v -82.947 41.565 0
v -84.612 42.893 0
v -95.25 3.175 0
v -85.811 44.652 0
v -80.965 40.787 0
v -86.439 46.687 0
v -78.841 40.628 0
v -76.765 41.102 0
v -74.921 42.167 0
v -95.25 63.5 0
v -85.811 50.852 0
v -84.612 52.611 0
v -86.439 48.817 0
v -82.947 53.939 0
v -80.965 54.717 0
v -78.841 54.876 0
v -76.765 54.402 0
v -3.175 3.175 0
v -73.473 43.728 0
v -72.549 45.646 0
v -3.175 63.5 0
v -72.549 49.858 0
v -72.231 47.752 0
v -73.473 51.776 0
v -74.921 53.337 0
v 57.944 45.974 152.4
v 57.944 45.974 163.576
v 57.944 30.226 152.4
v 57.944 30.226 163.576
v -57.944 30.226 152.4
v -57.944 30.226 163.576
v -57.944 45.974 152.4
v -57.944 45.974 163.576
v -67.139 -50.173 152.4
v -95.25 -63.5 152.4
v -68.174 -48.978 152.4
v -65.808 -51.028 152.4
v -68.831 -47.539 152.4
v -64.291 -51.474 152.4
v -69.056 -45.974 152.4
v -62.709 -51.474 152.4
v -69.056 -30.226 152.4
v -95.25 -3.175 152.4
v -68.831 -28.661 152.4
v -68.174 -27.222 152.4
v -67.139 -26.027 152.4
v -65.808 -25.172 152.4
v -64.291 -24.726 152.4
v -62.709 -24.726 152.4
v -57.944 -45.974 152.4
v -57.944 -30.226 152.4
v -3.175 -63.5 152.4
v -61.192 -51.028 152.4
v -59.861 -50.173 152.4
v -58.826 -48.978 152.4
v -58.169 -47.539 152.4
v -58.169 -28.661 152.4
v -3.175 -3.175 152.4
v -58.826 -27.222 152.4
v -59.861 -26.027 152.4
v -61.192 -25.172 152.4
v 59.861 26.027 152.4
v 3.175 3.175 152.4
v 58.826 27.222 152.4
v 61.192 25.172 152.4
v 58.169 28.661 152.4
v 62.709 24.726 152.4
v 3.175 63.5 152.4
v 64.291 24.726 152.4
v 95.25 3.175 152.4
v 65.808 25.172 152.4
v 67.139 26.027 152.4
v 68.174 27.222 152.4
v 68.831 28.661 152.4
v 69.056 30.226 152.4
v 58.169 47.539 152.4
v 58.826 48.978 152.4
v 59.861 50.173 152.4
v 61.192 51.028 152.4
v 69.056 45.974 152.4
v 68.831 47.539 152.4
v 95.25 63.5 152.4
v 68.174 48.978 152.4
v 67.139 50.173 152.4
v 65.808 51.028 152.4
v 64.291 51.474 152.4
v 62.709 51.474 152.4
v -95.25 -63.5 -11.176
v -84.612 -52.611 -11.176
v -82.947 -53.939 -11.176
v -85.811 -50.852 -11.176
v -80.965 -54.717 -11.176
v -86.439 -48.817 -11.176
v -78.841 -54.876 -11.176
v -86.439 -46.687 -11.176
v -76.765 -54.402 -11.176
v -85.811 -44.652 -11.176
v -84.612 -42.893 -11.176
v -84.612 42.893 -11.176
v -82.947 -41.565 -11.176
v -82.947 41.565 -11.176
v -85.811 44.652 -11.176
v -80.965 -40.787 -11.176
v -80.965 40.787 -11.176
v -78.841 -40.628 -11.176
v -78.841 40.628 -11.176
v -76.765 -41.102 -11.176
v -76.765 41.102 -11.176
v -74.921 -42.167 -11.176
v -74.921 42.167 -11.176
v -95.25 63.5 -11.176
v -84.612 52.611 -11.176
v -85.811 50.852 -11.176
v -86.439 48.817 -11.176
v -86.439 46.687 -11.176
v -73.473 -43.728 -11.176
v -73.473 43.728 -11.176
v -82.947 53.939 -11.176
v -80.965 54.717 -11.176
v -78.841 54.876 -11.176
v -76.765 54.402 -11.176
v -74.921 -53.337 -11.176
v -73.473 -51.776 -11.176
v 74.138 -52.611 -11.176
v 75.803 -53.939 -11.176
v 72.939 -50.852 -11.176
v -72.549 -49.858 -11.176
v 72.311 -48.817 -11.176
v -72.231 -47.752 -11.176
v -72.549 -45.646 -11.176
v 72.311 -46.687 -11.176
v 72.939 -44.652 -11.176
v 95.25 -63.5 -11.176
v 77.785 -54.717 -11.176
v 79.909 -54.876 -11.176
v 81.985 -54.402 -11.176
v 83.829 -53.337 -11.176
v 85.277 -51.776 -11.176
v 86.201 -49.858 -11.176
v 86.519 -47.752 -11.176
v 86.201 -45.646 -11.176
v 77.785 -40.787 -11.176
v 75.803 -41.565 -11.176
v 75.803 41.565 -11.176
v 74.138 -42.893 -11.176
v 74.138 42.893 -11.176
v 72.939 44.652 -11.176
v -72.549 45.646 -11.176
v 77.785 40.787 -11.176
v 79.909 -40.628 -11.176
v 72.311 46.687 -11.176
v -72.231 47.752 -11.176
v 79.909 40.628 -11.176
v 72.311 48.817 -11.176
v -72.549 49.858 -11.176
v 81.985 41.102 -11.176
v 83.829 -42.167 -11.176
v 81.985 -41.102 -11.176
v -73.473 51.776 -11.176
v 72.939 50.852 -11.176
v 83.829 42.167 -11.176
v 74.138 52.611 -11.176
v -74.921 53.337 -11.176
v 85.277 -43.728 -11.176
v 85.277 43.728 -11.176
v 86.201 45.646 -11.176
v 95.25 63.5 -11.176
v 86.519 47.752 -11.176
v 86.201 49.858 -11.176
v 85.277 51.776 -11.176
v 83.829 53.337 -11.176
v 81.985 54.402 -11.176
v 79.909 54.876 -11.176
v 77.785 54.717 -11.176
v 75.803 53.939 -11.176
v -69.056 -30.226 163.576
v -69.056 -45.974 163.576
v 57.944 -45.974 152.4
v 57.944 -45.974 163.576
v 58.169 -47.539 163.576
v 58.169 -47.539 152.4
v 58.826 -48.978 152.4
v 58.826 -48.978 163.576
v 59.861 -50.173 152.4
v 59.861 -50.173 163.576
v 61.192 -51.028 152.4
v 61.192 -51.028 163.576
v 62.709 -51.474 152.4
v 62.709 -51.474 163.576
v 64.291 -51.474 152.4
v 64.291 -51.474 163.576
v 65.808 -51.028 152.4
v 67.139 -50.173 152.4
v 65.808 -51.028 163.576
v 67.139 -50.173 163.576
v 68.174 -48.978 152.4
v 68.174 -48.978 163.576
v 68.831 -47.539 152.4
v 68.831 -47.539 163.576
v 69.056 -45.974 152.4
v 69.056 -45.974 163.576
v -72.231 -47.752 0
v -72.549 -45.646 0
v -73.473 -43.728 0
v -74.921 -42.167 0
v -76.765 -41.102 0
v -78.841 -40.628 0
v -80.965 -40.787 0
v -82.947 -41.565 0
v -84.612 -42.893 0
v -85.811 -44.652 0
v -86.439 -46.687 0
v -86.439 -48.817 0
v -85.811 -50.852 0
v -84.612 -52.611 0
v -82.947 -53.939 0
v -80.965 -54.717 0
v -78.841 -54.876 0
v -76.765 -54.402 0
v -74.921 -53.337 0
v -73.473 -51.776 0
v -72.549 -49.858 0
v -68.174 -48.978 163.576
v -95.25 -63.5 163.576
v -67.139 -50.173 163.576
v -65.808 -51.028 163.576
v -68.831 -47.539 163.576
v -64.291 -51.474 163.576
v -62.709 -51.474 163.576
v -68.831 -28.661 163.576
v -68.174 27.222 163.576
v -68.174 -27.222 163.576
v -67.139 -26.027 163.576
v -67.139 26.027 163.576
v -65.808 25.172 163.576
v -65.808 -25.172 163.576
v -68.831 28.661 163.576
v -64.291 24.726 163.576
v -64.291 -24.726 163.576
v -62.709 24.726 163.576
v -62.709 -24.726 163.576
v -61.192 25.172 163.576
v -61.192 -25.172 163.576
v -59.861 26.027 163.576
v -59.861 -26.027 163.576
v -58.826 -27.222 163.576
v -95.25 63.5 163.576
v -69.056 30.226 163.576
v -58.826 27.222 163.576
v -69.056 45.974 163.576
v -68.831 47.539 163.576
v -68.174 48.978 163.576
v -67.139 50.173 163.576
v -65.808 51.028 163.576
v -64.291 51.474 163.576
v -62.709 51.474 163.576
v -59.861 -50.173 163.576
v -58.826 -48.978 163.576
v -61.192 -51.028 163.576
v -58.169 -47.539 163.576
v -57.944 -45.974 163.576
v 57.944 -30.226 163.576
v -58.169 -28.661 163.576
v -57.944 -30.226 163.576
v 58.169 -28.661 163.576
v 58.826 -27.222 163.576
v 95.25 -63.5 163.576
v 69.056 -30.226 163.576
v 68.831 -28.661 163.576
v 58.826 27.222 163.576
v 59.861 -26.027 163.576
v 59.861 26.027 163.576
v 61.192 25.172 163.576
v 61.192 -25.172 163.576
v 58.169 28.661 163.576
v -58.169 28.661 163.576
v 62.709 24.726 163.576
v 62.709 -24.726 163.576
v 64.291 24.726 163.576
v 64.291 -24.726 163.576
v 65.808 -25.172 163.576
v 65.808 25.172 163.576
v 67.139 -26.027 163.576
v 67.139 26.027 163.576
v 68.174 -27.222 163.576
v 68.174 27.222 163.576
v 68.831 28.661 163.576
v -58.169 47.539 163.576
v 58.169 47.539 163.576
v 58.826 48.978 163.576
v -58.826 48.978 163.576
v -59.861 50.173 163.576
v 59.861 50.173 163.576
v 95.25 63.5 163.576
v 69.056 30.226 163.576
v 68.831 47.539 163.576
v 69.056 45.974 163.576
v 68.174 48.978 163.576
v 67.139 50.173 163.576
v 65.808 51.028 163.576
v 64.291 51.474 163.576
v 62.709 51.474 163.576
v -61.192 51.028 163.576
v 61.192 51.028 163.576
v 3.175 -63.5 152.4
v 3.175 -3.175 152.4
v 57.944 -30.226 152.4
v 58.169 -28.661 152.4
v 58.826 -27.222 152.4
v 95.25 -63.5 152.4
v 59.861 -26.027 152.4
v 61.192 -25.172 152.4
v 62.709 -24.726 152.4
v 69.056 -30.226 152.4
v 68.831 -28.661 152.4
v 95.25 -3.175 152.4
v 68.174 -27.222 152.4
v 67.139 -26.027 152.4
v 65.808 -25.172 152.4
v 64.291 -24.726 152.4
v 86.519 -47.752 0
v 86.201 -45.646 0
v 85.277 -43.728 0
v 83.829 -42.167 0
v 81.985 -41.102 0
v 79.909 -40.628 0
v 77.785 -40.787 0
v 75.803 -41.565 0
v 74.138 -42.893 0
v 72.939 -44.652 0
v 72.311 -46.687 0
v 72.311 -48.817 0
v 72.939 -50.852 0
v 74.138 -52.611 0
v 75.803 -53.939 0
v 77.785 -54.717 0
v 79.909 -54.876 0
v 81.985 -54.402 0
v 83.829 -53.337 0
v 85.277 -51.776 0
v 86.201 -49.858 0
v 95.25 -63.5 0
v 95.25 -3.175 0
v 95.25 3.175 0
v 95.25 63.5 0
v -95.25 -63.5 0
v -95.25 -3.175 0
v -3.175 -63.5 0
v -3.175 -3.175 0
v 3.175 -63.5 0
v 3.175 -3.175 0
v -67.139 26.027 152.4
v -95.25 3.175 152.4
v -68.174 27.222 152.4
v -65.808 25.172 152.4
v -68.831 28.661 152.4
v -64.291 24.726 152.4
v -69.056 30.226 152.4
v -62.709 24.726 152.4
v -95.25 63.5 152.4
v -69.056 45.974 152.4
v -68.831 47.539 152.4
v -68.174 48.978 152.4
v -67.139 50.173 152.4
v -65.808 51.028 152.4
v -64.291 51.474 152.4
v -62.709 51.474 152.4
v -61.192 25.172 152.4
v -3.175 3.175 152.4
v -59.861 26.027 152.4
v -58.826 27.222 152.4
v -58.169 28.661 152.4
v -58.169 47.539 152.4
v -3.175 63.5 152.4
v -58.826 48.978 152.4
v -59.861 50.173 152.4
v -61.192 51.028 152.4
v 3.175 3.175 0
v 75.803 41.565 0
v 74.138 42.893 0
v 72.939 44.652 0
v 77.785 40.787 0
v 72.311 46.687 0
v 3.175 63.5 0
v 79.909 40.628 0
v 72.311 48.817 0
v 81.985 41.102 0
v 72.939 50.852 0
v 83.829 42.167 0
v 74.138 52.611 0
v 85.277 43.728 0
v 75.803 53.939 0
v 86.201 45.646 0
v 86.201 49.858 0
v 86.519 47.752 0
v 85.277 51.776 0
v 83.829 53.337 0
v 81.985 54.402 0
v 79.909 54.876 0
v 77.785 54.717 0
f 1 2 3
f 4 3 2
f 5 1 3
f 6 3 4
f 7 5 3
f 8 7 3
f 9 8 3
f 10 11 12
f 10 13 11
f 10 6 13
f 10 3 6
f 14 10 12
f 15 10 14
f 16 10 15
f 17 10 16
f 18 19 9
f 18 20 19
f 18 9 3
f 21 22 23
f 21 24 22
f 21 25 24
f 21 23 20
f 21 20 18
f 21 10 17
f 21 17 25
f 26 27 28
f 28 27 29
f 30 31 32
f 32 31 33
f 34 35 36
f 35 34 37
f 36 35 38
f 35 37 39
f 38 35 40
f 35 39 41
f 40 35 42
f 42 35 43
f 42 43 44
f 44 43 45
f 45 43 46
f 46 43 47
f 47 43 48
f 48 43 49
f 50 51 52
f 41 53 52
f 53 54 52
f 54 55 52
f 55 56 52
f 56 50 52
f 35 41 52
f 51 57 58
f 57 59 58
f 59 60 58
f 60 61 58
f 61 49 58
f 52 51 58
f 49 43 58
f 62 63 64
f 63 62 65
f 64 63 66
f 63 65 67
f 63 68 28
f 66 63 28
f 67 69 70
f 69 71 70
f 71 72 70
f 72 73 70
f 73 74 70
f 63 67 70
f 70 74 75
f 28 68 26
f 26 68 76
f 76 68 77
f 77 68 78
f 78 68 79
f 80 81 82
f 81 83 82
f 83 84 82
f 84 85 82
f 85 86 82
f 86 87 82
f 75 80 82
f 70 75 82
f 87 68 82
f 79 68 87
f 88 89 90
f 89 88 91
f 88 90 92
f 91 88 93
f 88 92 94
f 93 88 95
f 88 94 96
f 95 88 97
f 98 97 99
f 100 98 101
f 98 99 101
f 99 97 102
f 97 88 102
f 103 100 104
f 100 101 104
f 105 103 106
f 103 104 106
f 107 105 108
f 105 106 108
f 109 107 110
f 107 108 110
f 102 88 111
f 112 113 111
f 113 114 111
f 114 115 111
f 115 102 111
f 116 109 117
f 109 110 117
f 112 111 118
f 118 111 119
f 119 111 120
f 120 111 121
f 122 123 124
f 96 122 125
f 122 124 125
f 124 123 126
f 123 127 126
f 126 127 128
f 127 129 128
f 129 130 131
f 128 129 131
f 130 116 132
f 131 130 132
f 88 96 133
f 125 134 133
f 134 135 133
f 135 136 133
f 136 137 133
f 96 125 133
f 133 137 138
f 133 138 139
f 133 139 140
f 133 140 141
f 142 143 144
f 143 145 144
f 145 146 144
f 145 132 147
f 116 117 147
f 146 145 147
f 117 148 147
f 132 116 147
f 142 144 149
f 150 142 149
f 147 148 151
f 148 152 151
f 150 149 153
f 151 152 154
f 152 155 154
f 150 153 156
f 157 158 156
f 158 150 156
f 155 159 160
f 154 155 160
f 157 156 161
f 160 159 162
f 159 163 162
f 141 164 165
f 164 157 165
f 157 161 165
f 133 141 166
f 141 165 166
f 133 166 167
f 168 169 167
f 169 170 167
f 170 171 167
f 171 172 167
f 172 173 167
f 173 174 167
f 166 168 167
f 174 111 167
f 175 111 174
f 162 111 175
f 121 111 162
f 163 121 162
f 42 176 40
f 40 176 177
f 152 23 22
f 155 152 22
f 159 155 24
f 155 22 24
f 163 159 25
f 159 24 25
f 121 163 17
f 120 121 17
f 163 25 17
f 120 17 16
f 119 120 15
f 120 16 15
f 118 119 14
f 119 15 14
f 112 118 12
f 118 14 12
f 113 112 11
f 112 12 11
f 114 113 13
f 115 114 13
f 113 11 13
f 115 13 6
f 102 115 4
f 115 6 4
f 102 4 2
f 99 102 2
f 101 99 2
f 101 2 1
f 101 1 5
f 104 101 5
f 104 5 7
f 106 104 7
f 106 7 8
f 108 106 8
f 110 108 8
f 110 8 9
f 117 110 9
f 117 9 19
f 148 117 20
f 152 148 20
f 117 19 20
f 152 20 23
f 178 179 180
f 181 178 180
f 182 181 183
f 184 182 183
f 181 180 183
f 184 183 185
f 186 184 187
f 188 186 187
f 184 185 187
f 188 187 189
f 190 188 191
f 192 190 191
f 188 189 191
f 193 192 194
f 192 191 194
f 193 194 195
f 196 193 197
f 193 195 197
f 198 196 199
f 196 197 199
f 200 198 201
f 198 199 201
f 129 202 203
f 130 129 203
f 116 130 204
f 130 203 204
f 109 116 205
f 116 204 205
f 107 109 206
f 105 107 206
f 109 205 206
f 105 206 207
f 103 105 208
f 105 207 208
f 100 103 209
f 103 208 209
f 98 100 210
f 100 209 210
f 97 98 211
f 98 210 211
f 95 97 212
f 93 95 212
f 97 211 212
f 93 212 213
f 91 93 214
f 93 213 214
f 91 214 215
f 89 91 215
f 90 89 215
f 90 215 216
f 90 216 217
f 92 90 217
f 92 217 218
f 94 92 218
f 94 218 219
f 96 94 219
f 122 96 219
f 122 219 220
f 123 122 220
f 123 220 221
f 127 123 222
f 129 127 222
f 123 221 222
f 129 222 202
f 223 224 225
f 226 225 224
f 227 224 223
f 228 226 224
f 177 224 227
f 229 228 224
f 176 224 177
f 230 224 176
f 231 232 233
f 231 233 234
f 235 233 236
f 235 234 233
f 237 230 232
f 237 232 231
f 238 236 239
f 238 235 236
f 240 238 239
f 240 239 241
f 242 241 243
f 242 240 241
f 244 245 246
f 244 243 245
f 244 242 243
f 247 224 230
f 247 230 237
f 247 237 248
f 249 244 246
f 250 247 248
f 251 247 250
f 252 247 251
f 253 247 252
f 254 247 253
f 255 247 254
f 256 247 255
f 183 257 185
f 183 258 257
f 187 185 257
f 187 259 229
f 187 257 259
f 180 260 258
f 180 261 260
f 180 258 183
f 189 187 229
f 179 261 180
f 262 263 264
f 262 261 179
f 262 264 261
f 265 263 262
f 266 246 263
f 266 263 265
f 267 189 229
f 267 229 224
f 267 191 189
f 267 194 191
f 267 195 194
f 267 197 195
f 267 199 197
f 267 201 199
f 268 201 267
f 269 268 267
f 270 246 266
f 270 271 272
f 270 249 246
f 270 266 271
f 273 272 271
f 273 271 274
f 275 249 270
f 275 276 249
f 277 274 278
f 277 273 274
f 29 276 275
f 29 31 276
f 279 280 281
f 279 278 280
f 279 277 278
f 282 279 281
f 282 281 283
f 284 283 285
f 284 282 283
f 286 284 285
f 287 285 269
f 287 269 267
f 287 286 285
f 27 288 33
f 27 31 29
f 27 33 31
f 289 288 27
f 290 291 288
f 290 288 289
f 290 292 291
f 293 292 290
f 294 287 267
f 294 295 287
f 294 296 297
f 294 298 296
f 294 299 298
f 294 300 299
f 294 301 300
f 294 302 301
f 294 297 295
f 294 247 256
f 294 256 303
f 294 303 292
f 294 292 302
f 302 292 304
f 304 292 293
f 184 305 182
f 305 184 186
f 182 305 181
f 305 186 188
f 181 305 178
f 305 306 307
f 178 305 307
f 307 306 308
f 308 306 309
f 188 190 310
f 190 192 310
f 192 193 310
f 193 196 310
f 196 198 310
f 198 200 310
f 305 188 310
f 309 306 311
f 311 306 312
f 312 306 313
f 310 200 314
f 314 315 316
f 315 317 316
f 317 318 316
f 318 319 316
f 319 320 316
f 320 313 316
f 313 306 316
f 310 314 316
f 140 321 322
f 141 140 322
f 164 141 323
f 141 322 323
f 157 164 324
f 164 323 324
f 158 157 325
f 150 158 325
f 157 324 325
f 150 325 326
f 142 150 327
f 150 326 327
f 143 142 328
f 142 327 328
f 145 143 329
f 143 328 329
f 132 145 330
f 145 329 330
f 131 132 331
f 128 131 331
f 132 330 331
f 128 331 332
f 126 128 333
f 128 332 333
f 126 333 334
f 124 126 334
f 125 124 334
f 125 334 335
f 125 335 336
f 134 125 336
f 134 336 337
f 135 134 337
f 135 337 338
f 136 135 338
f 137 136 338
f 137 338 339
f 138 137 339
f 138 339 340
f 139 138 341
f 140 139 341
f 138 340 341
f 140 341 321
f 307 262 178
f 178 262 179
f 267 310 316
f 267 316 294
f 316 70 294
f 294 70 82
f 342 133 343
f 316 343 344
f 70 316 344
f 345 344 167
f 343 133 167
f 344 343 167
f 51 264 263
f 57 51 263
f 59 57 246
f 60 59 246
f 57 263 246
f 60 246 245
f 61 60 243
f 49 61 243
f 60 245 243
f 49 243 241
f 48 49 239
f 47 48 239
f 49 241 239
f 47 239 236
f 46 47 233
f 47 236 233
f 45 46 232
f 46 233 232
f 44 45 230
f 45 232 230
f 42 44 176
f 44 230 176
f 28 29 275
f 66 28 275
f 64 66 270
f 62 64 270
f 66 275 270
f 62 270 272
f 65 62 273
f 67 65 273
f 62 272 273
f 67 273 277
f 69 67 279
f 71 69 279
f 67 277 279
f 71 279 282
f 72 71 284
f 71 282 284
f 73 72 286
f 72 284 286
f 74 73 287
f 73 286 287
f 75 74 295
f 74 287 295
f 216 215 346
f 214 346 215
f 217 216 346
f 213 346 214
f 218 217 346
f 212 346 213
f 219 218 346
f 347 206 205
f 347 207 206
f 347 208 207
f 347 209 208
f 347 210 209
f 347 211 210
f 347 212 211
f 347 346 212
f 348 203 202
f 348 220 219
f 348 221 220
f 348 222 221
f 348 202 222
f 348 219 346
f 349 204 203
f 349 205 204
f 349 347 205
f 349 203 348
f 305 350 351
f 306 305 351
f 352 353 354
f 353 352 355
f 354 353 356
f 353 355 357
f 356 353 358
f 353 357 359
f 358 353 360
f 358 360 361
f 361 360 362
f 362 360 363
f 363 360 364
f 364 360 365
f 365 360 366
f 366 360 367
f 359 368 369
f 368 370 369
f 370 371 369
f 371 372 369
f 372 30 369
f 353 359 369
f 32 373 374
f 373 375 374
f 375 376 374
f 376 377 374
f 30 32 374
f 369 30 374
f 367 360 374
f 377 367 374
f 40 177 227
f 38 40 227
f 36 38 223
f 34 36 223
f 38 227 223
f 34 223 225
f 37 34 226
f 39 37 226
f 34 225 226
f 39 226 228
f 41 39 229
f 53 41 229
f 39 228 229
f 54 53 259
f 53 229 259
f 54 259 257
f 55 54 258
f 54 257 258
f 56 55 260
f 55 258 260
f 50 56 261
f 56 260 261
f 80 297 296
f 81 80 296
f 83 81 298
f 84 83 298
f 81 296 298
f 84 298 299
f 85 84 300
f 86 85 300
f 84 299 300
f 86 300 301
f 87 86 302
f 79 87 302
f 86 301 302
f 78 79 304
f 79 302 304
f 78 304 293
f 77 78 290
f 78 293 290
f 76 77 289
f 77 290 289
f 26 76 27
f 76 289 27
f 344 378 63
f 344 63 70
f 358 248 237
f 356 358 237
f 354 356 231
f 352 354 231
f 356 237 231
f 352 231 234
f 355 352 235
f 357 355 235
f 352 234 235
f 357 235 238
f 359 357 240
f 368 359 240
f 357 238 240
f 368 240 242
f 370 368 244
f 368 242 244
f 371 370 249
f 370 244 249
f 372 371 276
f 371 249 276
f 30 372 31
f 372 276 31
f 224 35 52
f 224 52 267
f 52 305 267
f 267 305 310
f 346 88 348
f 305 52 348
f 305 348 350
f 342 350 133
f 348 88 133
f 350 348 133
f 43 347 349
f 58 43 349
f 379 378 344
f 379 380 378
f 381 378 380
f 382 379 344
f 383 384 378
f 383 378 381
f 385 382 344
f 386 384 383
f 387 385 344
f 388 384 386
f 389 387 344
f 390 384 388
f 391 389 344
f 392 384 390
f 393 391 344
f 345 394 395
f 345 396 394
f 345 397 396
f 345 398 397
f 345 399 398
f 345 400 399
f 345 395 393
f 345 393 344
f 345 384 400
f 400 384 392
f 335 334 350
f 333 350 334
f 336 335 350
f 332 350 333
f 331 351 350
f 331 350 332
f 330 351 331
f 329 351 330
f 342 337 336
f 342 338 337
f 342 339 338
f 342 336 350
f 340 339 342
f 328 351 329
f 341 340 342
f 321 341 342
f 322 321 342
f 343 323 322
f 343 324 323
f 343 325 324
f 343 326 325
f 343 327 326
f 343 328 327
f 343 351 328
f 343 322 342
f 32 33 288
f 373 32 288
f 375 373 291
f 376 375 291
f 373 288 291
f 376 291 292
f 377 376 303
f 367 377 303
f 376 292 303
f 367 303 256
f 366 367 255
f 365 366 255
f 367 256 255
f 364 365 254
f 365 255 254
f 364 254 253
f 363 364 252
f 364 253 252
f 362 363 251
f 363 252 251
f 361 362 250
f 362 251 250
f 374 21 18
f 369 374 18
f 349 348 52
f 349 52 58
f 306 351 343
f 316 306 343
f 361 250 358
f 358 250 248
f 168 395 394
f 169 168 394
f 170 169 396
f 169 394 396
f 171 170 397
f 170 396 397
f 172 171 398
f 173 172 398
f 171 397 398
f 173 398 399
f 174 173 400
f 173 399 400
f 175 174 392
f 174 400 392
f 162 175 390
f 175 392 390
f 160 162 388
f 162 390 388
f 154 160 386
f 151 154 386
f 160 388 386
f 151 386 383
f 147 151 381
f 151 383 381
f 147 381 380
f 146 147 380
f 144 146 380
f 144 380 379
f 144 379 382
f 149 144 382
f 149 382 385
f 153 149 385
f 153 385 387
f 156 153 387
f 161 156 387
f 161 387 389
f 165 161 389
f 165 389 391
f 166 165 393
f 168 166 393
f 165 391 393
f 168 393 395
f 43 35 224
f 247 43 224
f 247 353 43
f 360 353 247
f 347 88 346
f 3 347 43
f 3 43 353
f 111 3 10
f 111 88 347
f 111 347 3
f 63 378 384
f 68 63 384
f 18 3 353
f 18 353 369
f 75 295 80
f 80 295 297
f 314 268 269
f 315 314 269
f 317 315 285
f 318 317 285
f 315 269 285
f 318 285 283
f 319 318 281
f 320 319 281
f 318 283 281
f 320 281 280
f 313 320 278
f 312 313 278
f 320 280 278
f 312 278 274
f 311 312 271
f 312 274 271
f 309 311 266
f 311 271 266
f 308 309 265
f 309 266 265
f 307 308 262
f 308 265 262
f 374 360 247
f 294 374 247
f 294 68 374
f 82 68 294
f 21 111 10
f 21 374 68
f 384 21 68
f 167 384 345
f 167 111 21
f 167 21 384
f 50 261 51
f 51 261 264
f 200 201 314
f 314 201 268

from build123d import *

# Parameters (mm, degrees)
F0_W     = 190.5
F0_H     = 127
F0_R     = 7.14375
F1_DEPTH = 11.176
F2_W     = 6.35
F2_H     = 60.325
F2_H_2   = 6.35
F2_W_2   = 92.075
F3_DEPTH = 152.4
F4_W     = 190.5
F4_H     = 127
F5_DEPTH = 11.176
F7_DEPTH = 25.4


with BuildPart() as f1:
    # F0 (on Top) → F1 (new body)
    with BuildSketch(Plane.XY):
        Rectangle(F0_W, F0_H)
        with Locations((-79.375, -47.752)):
            Circle(F0_R, mode=Mode.SUBTRACT)
        with Locations((79.375, -47.752)):
            Circle(F0_R, mode=Mode.SUBTRACT)
        with Locations((-79.375, 47.752)):
            Circle(F0_R, mode=Mode.SUBTRACT)
        with Locations((79.375, 47.752)):
            Circle(F0_R, mode=Mode.SUBTRACT)
    extrude(amount=-F1_DEPTH)

    # F2 (on face) → F3 (join)
    with BuildSketch(Plane.XY):
        with Locations((0, 33.3375)):
            Rectangle(F2_W, F2_H)
        Rectangle(F2_W, F2_H_2)
        with Locations((-49.2125, 0)):
            Rectangle(F2_W_2, F2_H_2)
        with Locations((49.2125, 0)):
            Rectangle(F2_W_2, F2_H_2)
        with Locations((0, -33.3375)):
            Rectangle(F2_W, F2_H)
    extrude(amount=F3_DEPTH)

    # F4 (on face) → F5 (join)
    with BuildSketch(Plane.XY.offset(152.4)):
        Rectangle(F4_W, F4_H)
    extrude(amount=F5_DEPTH)

    # F6 (on face) → F7 (cut)
    with BuildSketch(Plane.XY.offset(163.576)):
        with BuildLine():
            ThreePointArc((-57.94375, -30.226), (-63.5, -24.66975), (-69.05625, -30.226))
            Line((-69.05625, -30.226), (-69.05625, -45.974))
            ThreePointArc((-69.05625, -45.974), (-63.5, -51.53025), (-57.94375, -45.974))
            Line((-57.94375, -45.974), (-57.94375, -30.226))
        make_face()
        with BuildLine():
            Line((69.05625, -45.974), (69.05625, -30.226))
            ThreePointArc((69.05625, -30.226), (63.5, -24.66975), (57.94375, -30.226))
            Line((57.94375, -30.226), (57.94375, -45.974))
            ThreePointArc((57.94375, -45.974), (63.5, -51.53025), (69.05625, -45.974))
        make_face()
        with BuildLine():
            Line((-69.05625, 45.974), (-69.05625, 30.226))
            ThreePointArc((-69.05625, 30.226), (-63.5, 24.66975), (-57.94375, 30.226))
            Line((-57.94375, 30.226), (-57.94375, 45.974))
            ThreePointArc((-57.94375, 45.974), (-63.5, 51.53025), (-69.05625, 45.974))
        make_face()
        with BuildLine():
            ThreePointArc((57.94375, 30.226), (63.5, 24.66975), (69.05625, 30.226))
            Line((69.05625, 30.226), (69.05625, 45.974))
            ThreePointArc((69.05625, 45.974), (63.5, 51.53025), (57.94375, 45.974))
            Line((57.94375, 45.974), (57.94375, 30.226))
        make_face()
    extrude(amount=-F7_DEPTH, mode=Mode.SUBTRACT)


solid = f1.part
